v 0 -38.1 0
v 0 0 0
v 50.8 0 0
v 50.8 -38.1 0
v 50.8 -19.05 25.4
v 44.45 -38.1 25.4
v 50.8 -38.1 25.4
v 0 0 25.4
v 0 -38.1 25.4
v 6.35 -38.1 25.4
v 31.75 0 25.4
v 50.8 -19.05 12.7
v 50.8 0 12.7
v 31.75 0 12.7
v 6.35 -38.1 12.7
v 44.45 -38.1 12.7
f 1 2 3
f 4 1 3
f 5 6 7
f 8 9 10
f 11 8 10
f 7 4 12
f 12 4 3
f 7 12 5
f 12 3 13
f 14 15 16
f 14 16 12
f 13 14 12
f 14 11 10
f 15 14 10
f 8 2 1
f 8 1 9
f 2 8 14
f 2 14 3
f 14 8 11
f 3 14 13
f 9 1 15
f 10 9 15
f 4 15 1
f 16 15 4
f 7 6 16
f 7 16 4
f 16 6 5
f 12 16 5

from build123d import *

# Parameters (mm, degrees)
F0_W     = 50.8
F0_H     = 25.4
F1_DEPTH = 38.1
F3_DEPTH = 12.7


# Not quite as in the source:
# - a length typed as a fraction of an inch, garbled in the dataset ("3 / 203.2 mm" for 3/8 in), is restored


with BuildPart() as f1:
    # F0 (on Front) → F1 (new body)
    with BuildSketch(Plane.XZ):
        with Locations((25.4, 12.7)):
            Rectangle(F0_W, F0_H)
    extrude(amount=F1_DEPTH)

    # F2 (on face) → F3 (cut)
    with BuildSketch(Plane.XY.offset(25.4)):
        Polygon((31.75, 0), (6.35, -38.1), (44.45, -38.1), (50.8, -19.05), (50.8, 0), align=None)
    extrude(amount=-F3_DEPTH, mode=Mode.SUBTRACT)


solid = f1.part
